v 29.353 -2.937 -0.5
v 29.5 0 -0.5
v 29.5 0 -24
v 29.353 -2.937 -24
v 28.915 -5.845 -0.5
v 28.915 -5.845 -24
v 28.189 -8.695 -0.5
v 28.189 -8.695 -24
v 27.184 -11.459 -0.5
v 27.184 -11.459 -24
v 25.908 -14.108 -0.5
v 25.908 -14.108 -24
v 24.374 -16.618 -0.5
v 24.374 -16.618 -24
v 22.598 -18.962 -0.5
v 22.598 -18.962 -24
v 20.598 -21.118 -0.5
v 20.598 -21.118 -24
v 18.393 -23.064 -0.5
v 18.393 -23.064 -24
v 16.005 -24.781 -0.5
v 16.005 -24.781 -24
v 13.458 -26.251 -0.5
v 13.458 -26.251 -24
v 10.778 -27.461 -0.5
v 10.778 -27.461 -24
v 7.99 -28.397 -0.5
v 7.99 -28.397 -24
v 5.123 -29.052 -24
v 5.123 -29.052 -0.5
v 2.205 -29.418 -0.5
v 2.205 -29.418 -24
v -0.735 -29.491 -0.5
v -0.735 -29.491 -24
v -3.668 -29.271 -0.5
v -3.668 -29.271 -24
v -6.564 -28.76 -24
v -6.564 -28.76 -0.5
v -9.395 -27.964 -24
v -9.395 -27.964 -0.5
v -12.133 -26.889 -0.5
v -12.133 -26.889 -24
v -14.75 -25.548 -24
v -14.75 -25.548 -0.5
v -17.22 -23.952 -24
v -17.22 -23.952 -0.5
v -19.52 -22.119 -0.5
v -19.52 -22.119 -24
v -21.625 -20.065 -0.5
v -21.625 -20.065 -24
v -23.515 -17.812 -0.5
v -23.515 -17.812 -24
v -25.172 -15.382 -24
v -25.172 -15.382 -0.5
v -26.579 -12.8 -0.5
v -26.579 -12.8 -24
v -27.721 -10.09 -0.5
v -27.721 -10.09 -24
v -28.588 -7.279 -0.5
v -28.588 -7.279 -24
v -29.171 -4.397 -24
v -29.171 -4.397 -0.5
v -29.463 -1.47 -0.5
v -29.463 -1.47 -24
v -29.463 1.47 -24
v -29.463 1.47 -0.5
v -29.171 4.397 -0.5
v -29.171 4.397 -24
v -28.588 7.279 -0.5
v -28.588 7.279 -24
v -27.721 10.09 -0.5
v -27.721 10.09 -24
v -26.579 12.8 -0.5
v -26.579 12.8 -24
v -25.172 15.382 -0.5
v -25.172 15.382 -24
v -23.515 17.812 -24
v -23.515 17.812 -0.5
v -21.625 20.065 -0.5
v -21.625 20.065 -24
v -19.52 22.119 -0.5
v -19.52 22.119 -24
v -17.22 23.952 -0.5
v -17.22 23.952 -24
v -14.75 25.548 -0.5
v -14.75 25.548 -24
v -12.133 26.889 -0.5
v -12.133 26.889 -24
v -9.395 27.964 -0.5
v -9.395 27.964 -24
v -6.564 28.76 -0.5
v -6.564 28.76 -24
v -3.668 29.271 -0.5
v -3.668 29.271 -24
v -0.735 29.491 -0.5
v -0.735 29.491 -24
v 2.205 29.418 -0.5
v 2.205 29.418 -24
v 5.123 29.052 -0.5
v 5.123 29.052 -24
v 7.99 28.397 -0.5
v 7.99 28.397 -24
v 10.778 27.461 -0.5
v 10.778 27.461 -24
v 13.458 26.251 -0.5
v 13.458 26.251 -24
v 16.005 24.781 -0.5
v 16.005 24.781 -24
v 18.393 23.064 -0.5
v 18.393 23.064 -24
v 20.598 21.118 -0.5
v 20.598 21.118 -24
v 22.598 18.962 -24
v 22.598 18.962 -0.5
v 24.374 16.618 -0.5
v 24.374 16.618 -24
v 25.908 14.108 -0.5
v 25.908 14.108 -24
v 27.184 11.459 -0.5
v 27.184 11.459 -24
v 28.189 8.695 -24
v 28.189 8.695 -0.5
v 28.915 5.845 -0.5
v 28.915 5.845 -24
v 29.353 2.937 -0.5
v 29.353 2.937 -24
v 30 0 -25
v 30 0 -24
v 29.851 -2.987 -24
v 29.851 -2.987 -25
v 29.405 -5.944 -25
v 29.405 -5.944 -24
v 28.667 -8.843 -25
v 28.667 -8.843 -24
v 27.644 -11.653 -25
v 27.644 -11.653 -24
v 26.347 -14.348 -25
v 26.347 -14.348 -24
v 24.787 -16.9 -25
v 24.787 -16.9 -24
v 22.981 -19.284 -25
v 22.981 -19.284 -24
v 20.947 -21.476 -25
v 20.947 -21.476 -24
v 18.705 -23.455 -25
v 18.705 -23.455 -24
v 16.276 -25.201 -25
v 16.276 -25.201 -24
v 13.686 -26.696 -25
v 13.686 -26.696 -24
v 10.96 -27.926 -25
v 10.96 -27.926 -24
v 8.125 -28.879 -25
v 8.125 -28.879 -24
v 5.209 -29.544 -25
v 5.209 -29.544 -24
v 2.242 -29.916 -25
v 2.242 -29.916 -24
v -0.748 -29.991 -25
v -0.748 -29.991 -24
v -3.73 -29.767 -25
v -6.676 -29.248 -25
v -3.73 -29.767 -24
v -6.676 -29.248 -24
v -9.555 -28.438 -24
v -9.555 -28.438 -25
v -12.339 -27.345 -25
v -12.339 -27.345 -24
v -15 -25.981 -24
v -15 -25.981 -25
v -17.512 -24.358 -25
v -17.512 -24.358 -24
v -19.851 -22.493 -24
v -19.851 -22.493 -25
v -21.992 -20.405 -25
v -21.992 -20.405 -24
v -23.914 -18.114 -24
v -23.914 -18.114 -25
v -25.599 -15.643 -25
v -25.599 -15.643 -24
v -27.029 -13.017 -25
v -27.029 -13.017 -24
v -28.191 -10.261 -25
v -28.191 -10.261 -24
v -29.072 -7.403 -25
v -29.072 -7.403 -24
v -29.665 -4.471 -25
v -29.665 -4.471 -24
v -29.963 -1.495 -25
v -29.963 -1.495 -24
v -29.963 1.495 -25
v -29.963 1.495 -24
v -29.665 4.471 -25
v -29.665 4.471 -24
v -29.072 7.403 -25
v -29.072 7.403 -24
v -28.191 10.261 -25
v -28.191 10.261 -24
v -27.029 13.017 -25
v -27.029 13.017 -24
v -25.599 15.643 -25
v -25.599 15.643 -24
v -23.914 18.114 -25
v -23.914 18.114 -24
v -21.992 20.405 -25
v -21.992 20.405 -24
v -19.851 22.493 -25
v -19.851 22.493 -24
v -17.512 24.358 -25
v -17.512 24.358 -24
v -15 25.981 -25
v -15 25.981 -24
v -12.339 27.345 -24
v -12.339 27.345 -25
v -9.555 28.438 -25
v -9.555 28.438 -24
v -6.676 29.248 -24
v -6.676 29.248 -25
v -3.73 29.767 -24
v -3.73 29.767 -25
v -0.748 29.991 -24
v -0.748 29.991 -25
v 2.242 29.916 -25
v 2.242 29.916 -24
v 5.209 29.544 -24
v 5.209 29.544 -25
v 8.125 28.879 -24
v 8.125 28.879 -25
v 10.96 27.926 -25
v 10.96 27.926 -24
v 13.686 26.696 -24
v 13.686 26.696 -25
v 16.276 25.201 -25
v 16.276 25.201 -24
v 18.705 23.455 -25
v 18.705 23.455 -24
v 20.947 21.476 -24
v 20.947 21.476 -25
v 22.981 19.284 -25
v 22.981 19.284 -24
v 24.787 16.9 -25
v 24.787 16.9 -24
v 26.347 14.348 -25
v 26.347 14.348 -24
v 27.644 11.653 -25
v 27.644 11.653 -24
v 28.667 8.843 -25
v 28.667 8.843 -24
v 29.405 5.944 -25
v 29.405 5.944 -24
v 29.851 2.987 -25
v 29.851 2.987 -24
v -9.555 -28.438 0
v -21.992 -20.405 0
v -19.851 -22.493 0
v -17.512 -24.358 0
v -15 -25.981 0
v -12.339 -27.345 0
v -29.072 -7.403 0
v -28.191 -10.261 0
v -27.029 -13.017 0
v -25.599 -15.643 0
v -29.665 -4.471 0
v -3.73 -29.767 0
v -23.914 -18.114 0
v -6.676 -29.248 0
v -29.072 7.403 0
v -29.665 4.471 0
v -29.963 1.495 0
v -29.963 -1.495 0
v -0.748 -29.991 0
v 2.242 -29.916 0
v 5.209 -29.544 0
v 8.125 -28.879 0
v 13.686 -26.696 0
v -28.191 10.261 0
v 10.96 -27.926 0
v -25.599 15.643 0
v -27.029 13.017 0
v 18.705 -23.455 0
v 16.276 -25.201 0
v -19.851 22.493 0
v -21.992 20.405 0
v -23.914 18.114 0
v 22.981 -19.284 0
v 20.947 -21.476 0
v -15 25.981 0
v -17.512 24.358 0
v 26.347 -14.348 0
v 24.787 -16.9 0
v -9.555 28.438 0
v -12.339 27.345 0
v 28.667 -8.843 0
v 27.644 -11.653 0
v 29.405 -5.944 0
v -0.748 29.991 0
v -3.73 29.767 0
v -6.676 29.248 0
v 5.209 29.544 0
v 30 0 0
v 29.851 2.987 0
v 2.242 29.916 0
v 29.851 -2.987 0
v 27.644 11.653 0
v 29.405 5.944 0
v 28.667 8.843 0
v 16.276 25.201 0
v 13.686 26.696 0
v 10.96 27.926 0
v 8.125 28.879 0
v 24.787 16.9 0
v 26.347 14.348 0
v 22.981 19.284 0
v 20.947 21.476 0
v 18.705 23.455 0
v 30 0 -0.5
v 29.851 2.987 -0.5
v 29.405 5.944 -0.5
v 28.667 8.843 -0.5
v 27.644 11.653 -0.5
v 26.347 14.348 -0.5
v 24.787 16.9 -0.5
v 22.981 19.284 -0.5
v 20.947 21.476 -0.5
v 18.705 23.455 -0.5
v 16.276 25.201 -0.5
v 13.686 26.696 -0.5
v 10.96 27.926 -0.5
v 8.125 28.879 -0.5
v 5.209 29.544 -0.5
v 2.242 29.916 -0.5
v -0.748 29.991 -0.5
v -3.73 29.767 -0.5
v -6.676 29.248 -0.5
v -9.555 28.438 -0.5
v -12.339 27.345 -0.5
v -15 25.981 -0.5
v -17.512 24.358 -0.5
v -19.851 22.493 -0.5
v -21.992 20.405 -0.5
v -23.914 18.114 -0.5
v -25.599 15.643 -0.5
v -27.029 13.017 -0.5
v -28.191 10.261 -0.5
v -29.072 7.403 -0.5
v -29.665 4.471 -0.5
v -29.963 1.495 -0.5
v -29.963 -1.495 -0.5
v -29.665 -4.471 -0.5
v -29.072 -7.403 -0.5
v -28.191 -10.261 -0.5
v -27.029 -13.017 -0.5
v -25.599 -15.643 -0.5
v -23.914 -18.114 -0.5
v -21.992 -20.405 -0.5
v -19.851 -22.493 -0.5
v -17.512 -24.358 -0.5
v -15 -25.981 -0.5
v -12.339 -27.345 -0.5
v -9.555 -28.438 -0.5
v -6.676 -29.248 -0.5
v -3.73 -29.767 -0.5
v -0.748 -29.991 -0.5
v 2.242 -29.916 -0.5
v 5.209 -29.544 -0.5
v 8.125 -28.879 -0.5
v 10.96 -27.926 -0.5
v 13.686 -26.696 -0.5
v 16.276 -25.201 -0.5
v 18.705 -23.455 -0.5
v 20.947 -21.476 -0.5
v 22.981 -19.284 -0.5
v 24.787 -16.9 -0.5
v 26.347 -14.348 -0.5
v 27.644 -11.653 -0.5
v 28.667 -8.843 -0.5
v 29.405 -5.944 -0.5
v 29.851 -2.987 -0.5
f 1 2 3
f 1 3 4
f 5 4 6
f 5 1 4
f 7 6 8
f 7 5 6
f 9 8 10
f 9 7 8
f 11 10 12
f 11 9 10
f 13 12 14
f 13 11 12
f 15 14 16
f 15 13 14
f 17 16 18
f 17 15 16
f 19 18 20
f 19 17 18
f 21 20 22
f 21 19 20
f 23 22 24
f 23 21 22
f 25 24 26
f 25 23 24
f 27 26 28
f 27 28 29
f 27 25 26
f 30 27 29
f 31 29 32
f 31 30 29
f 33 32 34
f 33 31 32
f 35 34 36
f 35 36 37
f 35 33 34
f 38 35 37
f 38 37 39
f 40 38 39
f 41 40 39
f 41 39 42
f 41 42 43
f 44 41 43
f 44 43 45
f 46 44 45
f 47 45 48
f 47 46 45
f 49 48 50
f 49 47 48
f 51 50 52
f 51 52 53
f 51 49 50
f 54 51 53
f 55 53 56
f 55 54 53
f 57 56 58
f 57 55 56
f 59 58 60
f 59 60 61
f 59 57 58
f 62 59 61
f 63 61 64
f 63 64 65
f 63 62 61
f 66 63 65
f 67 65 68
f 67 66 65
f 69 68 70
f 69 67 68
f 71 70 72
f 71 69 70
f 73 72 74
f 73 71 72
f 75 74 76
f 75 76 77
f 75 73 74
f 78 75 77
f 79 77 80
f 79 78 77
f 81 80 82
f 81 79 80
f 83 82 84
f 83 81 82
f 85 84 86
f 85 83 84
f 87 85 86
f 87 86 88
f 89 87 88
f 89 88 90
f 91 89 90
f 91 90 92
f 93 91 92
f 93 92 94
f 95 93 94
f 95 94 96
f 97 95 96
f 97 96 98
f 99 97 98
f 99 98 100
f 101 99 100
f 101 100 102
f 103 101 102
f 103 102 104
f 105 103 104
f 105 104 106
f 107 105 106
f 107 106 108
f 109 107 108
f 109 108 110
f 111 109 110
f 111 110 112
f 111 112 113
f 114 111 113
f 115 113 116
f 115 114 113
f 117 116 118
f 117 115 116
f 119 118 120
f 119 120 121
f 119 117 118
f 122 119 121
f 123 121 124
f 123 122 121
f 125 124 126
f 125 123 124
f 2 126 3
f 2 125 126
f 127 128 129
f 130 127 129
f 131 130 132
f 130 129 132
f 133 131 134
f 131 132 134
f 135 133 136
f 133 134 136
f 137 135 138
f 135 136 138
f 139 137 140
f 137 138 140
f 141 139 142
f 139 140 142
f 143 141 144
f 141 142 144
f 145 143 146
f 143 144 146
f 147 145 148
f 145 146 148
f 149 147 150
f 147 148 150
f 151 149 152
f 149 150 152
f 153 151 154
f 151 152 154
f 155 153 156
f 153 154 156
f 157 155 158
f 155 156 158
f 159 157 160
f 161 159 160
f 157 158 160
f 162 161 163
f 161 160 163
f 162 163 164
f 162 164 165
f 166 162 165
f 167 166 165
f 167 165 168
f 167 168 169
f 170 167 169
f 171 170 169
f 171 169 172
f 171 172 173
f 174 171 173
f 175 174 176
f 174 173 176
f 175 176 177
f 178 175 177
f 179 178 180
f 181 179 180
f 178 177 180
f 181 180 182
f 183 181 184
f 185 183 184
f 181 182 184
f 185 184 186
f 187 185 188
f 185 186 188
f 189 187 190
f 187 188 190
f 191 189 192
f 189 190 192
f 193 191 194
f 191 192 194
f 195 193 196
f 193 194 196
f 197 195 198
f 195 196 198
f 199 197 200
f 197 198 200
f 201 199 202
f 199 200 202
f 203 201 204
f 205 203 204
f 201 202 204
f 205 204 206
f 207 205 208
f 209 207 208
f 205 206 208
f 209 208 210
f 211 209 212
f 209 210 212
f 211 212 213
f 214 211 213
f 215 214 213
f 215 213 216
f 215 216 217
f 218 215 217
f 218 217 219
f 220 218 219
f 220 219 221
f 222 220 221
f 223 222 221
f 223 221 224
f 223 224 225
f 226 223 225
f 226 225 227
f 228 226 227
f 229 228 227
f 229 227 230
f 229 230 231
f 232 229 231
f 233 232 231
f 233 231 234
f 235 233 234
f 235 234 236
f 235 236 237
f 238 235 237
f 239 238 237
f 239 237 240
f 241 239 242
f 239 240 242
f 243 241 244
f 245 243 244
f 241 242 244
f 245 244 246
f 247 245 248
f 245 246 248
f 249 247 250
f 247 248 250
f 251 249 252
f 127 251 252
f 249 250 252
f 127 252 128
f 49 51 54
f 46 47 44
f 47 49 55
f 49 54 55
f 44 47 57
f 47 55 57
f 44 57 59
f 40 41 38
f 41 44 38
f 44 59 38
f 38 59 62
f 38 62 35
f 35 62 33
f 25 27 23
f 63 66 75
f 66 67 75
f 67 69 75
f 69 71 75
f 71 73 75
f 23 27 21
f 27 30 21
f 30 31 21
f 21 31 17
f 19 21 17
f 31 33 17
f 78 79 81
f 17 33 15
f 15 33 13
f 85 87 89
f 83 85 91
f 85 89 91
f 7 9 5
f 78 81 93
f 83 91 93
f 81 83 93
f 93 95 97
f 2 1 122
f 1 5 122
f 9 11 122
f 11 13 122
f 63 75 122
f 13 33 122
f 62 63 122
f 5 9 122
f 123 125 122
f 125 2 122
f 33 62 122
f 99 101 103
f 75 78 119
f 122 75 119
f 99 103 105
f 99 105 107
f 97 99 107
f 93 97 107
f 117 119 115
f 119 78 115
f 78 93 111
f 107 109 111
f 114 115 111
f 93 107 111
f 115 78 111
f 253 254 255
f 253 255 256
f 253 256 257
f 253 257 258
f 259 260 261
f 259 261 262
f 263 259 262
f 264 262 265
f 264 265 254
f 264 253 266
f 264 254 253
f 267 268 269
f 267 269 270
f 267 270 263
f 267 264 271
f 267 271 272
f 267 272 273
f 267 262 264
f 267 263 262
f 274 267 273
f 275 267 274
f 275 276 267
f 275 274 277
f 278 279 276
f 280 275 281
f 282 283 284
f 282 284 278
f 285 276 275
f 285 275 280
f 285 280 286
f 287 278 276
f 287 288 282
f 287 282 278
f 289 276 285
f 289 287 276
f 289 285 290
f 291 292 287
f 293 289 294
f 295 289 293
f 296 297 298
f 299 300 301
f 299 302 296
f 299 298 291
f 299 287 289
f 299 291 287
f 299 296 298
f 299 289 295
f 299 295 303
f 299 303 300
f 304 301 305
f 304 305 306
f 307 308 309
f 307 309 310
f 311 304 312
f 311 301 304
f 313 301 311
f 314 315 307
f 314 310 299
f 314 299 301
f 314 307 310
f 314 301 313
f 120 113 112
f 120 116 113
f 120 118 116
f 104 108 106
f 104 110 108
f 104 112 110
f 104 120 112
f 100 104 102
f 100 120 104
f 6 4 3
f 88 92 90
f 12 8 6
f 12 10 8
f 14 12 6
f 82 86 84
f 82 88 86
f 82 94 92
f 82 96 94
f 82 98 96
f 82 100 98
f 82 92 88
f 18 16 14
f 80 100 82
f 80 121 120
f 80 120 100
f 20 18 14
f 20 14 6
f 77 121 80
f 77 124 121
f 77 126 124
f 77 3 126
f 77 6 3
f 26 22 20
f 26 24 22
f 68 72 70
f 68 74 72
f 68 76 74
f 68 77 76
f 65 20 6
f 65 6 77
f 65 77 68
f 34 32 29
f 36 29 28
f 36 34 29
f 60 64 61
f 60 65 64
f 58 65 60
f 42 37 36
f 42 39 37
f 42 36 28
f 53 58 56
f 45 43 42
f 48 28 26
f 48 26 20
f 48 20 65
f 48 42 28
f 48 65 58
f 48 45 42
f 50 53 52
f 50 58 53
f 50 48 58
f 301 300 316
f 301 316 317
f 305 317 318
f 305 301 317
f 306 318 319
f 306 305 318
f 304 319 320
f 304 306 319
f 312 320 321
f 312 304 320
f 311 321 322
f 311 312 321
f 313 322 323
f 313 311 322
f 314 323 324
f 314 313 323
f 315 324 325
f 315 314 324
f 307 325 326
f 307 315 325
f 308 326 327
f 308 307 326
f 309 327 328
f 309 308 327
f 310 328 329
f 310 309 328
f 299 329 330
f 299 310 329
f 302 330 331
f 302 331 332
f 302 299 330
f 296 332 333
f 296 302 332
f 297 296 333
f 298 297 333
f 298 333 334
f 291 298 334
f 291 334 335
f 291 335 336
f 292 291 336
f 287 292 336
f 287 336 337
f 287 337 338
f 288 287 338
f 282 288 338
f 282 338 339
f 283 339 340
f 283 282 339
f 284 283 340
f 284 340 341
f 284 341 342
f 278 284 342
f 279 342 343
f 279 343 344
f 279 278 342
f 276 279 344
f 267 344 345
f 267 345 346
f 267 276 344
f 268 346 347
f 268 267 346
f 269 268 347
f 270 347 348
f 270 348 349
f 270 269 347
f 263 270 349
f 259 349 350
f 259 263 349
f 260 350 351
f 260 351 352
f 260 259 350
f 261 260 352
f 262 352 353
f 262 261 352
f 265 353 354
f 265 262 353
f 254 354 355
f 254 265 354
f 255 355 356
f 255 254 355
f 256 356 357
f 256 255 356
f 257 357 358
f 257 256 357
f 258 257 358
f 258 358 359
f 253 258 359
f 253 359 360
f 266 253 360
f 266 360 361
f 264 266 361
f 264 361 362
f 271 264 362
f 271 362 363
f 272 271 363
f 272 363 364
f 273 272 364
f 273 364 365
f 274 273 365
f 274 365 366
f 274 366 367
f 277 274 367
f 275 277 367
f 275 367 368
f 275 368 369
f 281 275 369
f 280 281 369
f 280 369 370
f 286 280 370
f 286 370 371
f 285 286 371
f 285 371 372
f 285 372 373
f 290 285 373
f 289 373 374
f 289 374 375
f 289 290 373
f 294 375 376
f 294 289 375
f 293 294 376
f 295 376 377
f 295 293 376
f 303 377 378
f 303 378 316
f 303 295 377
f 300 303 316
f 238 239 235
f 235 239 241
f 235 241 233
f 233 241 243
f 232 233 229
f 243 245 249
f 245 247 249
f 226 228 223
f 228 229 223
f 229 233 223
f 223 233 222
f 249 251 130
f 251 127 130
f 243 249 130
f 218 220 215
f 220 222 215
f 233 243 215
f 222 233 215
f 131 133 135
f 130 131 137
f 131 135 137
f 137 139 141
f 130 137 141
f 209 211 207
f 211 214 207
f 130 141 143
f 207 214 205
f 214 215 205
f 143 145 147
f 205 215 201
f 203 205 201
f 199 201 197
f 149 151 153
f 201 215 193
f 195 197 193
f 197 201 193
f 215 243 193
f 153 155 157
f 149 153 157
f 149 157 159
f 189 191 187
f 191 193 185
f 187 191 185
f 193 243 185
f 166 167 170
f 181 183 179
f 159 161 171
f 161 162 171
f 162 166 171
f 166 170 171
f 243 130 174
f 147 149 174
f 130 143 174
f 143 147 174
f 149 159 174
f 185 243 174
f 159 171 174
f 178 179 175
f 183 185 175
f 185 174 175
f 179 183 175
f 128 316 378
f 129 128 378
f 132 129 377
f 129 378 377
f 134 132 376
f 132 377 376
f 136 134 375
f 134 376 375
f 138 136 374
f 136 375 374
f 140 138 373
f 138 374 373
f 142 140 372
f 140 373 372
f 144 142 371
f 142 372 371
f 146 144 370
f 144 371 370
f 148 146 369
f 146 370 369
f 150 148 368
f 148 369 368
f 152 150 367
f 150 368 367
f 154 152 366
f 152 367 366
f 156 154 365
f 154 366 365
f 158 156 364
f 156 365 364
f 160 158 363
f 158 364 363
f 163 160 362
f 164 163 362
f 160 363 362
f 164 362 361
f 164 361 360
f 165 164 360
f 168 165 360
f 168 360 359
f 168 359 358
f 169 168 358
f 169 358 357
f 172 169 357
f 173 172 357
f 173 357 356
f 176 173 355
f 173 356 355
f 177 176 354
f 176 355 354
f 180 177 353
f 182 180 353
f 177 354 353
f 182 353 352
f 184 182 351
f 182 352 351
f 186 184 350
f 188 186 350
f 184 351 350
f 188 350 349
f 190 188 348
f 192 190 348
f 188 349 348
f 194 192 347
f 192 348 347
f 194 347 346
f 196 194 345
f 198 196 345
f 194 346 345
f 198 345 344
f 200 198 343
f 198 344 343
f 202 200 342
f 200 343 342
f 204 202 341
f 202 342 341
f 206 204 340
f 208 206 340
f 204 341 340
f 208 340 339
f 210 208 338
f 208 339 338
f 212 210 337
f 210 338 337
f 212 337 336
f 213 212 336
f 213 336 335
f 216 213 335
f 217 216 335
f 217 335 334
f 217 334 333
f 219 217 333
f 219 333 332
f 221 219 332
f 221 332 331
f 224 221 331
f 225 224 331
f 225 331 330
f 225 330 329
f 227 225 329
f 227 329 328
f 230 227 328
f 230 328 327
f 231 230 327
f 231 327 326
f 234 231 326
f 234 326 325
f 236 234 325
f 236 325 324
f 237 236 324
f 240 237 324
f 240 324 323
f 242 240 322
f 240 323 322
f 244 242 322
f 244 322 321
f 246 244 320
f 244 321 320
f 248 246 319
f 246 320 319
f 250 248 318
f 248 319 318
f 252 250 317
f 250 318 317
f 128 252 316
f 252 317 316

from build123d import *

# Parameters (mm, degrees)
F0_R     = 30
F1_DEPTH = 0.5
F2_W     = 30
F2_H     = 1
F4_R     = 30
F4_R_2   = 29.5
F5_DEPTH = 23.5


with BuildPart() as f1:
    # F0 (on Top) → F1 (new body)
    with BuildSketch(Plane.XY):
        Circle(F0_R)
    extrude(amount=-F1_DEPTH)



with BuildPart() as f3:
    # F2 (on Front) → F3 (revolve)
    with BuildSketch(Plane.XZ):
        with Locations((15, -24.5)):
            Rectangle(F2_W, F2_H)
    revolve(axis=Axis((0, 0, -12.5), (0, 0, -1)))


with BuildPart() as f1_1:
    add(f1.part)

    add(f3.part)  # F5 merges F3
    # F4 (on face) → F5 (join, through all)
    with BuildSketch(Plane(origin=(0, 0, -0.5), x_dir=(1, 0, 0), z_dir=(0, 0, -1))):
        Circle(F4_R)
        Circle(F4_R_2, mode=Mode.SUBTRACT)
    extrude(amount=F5_DEPTH)


solid = f1_1.part
